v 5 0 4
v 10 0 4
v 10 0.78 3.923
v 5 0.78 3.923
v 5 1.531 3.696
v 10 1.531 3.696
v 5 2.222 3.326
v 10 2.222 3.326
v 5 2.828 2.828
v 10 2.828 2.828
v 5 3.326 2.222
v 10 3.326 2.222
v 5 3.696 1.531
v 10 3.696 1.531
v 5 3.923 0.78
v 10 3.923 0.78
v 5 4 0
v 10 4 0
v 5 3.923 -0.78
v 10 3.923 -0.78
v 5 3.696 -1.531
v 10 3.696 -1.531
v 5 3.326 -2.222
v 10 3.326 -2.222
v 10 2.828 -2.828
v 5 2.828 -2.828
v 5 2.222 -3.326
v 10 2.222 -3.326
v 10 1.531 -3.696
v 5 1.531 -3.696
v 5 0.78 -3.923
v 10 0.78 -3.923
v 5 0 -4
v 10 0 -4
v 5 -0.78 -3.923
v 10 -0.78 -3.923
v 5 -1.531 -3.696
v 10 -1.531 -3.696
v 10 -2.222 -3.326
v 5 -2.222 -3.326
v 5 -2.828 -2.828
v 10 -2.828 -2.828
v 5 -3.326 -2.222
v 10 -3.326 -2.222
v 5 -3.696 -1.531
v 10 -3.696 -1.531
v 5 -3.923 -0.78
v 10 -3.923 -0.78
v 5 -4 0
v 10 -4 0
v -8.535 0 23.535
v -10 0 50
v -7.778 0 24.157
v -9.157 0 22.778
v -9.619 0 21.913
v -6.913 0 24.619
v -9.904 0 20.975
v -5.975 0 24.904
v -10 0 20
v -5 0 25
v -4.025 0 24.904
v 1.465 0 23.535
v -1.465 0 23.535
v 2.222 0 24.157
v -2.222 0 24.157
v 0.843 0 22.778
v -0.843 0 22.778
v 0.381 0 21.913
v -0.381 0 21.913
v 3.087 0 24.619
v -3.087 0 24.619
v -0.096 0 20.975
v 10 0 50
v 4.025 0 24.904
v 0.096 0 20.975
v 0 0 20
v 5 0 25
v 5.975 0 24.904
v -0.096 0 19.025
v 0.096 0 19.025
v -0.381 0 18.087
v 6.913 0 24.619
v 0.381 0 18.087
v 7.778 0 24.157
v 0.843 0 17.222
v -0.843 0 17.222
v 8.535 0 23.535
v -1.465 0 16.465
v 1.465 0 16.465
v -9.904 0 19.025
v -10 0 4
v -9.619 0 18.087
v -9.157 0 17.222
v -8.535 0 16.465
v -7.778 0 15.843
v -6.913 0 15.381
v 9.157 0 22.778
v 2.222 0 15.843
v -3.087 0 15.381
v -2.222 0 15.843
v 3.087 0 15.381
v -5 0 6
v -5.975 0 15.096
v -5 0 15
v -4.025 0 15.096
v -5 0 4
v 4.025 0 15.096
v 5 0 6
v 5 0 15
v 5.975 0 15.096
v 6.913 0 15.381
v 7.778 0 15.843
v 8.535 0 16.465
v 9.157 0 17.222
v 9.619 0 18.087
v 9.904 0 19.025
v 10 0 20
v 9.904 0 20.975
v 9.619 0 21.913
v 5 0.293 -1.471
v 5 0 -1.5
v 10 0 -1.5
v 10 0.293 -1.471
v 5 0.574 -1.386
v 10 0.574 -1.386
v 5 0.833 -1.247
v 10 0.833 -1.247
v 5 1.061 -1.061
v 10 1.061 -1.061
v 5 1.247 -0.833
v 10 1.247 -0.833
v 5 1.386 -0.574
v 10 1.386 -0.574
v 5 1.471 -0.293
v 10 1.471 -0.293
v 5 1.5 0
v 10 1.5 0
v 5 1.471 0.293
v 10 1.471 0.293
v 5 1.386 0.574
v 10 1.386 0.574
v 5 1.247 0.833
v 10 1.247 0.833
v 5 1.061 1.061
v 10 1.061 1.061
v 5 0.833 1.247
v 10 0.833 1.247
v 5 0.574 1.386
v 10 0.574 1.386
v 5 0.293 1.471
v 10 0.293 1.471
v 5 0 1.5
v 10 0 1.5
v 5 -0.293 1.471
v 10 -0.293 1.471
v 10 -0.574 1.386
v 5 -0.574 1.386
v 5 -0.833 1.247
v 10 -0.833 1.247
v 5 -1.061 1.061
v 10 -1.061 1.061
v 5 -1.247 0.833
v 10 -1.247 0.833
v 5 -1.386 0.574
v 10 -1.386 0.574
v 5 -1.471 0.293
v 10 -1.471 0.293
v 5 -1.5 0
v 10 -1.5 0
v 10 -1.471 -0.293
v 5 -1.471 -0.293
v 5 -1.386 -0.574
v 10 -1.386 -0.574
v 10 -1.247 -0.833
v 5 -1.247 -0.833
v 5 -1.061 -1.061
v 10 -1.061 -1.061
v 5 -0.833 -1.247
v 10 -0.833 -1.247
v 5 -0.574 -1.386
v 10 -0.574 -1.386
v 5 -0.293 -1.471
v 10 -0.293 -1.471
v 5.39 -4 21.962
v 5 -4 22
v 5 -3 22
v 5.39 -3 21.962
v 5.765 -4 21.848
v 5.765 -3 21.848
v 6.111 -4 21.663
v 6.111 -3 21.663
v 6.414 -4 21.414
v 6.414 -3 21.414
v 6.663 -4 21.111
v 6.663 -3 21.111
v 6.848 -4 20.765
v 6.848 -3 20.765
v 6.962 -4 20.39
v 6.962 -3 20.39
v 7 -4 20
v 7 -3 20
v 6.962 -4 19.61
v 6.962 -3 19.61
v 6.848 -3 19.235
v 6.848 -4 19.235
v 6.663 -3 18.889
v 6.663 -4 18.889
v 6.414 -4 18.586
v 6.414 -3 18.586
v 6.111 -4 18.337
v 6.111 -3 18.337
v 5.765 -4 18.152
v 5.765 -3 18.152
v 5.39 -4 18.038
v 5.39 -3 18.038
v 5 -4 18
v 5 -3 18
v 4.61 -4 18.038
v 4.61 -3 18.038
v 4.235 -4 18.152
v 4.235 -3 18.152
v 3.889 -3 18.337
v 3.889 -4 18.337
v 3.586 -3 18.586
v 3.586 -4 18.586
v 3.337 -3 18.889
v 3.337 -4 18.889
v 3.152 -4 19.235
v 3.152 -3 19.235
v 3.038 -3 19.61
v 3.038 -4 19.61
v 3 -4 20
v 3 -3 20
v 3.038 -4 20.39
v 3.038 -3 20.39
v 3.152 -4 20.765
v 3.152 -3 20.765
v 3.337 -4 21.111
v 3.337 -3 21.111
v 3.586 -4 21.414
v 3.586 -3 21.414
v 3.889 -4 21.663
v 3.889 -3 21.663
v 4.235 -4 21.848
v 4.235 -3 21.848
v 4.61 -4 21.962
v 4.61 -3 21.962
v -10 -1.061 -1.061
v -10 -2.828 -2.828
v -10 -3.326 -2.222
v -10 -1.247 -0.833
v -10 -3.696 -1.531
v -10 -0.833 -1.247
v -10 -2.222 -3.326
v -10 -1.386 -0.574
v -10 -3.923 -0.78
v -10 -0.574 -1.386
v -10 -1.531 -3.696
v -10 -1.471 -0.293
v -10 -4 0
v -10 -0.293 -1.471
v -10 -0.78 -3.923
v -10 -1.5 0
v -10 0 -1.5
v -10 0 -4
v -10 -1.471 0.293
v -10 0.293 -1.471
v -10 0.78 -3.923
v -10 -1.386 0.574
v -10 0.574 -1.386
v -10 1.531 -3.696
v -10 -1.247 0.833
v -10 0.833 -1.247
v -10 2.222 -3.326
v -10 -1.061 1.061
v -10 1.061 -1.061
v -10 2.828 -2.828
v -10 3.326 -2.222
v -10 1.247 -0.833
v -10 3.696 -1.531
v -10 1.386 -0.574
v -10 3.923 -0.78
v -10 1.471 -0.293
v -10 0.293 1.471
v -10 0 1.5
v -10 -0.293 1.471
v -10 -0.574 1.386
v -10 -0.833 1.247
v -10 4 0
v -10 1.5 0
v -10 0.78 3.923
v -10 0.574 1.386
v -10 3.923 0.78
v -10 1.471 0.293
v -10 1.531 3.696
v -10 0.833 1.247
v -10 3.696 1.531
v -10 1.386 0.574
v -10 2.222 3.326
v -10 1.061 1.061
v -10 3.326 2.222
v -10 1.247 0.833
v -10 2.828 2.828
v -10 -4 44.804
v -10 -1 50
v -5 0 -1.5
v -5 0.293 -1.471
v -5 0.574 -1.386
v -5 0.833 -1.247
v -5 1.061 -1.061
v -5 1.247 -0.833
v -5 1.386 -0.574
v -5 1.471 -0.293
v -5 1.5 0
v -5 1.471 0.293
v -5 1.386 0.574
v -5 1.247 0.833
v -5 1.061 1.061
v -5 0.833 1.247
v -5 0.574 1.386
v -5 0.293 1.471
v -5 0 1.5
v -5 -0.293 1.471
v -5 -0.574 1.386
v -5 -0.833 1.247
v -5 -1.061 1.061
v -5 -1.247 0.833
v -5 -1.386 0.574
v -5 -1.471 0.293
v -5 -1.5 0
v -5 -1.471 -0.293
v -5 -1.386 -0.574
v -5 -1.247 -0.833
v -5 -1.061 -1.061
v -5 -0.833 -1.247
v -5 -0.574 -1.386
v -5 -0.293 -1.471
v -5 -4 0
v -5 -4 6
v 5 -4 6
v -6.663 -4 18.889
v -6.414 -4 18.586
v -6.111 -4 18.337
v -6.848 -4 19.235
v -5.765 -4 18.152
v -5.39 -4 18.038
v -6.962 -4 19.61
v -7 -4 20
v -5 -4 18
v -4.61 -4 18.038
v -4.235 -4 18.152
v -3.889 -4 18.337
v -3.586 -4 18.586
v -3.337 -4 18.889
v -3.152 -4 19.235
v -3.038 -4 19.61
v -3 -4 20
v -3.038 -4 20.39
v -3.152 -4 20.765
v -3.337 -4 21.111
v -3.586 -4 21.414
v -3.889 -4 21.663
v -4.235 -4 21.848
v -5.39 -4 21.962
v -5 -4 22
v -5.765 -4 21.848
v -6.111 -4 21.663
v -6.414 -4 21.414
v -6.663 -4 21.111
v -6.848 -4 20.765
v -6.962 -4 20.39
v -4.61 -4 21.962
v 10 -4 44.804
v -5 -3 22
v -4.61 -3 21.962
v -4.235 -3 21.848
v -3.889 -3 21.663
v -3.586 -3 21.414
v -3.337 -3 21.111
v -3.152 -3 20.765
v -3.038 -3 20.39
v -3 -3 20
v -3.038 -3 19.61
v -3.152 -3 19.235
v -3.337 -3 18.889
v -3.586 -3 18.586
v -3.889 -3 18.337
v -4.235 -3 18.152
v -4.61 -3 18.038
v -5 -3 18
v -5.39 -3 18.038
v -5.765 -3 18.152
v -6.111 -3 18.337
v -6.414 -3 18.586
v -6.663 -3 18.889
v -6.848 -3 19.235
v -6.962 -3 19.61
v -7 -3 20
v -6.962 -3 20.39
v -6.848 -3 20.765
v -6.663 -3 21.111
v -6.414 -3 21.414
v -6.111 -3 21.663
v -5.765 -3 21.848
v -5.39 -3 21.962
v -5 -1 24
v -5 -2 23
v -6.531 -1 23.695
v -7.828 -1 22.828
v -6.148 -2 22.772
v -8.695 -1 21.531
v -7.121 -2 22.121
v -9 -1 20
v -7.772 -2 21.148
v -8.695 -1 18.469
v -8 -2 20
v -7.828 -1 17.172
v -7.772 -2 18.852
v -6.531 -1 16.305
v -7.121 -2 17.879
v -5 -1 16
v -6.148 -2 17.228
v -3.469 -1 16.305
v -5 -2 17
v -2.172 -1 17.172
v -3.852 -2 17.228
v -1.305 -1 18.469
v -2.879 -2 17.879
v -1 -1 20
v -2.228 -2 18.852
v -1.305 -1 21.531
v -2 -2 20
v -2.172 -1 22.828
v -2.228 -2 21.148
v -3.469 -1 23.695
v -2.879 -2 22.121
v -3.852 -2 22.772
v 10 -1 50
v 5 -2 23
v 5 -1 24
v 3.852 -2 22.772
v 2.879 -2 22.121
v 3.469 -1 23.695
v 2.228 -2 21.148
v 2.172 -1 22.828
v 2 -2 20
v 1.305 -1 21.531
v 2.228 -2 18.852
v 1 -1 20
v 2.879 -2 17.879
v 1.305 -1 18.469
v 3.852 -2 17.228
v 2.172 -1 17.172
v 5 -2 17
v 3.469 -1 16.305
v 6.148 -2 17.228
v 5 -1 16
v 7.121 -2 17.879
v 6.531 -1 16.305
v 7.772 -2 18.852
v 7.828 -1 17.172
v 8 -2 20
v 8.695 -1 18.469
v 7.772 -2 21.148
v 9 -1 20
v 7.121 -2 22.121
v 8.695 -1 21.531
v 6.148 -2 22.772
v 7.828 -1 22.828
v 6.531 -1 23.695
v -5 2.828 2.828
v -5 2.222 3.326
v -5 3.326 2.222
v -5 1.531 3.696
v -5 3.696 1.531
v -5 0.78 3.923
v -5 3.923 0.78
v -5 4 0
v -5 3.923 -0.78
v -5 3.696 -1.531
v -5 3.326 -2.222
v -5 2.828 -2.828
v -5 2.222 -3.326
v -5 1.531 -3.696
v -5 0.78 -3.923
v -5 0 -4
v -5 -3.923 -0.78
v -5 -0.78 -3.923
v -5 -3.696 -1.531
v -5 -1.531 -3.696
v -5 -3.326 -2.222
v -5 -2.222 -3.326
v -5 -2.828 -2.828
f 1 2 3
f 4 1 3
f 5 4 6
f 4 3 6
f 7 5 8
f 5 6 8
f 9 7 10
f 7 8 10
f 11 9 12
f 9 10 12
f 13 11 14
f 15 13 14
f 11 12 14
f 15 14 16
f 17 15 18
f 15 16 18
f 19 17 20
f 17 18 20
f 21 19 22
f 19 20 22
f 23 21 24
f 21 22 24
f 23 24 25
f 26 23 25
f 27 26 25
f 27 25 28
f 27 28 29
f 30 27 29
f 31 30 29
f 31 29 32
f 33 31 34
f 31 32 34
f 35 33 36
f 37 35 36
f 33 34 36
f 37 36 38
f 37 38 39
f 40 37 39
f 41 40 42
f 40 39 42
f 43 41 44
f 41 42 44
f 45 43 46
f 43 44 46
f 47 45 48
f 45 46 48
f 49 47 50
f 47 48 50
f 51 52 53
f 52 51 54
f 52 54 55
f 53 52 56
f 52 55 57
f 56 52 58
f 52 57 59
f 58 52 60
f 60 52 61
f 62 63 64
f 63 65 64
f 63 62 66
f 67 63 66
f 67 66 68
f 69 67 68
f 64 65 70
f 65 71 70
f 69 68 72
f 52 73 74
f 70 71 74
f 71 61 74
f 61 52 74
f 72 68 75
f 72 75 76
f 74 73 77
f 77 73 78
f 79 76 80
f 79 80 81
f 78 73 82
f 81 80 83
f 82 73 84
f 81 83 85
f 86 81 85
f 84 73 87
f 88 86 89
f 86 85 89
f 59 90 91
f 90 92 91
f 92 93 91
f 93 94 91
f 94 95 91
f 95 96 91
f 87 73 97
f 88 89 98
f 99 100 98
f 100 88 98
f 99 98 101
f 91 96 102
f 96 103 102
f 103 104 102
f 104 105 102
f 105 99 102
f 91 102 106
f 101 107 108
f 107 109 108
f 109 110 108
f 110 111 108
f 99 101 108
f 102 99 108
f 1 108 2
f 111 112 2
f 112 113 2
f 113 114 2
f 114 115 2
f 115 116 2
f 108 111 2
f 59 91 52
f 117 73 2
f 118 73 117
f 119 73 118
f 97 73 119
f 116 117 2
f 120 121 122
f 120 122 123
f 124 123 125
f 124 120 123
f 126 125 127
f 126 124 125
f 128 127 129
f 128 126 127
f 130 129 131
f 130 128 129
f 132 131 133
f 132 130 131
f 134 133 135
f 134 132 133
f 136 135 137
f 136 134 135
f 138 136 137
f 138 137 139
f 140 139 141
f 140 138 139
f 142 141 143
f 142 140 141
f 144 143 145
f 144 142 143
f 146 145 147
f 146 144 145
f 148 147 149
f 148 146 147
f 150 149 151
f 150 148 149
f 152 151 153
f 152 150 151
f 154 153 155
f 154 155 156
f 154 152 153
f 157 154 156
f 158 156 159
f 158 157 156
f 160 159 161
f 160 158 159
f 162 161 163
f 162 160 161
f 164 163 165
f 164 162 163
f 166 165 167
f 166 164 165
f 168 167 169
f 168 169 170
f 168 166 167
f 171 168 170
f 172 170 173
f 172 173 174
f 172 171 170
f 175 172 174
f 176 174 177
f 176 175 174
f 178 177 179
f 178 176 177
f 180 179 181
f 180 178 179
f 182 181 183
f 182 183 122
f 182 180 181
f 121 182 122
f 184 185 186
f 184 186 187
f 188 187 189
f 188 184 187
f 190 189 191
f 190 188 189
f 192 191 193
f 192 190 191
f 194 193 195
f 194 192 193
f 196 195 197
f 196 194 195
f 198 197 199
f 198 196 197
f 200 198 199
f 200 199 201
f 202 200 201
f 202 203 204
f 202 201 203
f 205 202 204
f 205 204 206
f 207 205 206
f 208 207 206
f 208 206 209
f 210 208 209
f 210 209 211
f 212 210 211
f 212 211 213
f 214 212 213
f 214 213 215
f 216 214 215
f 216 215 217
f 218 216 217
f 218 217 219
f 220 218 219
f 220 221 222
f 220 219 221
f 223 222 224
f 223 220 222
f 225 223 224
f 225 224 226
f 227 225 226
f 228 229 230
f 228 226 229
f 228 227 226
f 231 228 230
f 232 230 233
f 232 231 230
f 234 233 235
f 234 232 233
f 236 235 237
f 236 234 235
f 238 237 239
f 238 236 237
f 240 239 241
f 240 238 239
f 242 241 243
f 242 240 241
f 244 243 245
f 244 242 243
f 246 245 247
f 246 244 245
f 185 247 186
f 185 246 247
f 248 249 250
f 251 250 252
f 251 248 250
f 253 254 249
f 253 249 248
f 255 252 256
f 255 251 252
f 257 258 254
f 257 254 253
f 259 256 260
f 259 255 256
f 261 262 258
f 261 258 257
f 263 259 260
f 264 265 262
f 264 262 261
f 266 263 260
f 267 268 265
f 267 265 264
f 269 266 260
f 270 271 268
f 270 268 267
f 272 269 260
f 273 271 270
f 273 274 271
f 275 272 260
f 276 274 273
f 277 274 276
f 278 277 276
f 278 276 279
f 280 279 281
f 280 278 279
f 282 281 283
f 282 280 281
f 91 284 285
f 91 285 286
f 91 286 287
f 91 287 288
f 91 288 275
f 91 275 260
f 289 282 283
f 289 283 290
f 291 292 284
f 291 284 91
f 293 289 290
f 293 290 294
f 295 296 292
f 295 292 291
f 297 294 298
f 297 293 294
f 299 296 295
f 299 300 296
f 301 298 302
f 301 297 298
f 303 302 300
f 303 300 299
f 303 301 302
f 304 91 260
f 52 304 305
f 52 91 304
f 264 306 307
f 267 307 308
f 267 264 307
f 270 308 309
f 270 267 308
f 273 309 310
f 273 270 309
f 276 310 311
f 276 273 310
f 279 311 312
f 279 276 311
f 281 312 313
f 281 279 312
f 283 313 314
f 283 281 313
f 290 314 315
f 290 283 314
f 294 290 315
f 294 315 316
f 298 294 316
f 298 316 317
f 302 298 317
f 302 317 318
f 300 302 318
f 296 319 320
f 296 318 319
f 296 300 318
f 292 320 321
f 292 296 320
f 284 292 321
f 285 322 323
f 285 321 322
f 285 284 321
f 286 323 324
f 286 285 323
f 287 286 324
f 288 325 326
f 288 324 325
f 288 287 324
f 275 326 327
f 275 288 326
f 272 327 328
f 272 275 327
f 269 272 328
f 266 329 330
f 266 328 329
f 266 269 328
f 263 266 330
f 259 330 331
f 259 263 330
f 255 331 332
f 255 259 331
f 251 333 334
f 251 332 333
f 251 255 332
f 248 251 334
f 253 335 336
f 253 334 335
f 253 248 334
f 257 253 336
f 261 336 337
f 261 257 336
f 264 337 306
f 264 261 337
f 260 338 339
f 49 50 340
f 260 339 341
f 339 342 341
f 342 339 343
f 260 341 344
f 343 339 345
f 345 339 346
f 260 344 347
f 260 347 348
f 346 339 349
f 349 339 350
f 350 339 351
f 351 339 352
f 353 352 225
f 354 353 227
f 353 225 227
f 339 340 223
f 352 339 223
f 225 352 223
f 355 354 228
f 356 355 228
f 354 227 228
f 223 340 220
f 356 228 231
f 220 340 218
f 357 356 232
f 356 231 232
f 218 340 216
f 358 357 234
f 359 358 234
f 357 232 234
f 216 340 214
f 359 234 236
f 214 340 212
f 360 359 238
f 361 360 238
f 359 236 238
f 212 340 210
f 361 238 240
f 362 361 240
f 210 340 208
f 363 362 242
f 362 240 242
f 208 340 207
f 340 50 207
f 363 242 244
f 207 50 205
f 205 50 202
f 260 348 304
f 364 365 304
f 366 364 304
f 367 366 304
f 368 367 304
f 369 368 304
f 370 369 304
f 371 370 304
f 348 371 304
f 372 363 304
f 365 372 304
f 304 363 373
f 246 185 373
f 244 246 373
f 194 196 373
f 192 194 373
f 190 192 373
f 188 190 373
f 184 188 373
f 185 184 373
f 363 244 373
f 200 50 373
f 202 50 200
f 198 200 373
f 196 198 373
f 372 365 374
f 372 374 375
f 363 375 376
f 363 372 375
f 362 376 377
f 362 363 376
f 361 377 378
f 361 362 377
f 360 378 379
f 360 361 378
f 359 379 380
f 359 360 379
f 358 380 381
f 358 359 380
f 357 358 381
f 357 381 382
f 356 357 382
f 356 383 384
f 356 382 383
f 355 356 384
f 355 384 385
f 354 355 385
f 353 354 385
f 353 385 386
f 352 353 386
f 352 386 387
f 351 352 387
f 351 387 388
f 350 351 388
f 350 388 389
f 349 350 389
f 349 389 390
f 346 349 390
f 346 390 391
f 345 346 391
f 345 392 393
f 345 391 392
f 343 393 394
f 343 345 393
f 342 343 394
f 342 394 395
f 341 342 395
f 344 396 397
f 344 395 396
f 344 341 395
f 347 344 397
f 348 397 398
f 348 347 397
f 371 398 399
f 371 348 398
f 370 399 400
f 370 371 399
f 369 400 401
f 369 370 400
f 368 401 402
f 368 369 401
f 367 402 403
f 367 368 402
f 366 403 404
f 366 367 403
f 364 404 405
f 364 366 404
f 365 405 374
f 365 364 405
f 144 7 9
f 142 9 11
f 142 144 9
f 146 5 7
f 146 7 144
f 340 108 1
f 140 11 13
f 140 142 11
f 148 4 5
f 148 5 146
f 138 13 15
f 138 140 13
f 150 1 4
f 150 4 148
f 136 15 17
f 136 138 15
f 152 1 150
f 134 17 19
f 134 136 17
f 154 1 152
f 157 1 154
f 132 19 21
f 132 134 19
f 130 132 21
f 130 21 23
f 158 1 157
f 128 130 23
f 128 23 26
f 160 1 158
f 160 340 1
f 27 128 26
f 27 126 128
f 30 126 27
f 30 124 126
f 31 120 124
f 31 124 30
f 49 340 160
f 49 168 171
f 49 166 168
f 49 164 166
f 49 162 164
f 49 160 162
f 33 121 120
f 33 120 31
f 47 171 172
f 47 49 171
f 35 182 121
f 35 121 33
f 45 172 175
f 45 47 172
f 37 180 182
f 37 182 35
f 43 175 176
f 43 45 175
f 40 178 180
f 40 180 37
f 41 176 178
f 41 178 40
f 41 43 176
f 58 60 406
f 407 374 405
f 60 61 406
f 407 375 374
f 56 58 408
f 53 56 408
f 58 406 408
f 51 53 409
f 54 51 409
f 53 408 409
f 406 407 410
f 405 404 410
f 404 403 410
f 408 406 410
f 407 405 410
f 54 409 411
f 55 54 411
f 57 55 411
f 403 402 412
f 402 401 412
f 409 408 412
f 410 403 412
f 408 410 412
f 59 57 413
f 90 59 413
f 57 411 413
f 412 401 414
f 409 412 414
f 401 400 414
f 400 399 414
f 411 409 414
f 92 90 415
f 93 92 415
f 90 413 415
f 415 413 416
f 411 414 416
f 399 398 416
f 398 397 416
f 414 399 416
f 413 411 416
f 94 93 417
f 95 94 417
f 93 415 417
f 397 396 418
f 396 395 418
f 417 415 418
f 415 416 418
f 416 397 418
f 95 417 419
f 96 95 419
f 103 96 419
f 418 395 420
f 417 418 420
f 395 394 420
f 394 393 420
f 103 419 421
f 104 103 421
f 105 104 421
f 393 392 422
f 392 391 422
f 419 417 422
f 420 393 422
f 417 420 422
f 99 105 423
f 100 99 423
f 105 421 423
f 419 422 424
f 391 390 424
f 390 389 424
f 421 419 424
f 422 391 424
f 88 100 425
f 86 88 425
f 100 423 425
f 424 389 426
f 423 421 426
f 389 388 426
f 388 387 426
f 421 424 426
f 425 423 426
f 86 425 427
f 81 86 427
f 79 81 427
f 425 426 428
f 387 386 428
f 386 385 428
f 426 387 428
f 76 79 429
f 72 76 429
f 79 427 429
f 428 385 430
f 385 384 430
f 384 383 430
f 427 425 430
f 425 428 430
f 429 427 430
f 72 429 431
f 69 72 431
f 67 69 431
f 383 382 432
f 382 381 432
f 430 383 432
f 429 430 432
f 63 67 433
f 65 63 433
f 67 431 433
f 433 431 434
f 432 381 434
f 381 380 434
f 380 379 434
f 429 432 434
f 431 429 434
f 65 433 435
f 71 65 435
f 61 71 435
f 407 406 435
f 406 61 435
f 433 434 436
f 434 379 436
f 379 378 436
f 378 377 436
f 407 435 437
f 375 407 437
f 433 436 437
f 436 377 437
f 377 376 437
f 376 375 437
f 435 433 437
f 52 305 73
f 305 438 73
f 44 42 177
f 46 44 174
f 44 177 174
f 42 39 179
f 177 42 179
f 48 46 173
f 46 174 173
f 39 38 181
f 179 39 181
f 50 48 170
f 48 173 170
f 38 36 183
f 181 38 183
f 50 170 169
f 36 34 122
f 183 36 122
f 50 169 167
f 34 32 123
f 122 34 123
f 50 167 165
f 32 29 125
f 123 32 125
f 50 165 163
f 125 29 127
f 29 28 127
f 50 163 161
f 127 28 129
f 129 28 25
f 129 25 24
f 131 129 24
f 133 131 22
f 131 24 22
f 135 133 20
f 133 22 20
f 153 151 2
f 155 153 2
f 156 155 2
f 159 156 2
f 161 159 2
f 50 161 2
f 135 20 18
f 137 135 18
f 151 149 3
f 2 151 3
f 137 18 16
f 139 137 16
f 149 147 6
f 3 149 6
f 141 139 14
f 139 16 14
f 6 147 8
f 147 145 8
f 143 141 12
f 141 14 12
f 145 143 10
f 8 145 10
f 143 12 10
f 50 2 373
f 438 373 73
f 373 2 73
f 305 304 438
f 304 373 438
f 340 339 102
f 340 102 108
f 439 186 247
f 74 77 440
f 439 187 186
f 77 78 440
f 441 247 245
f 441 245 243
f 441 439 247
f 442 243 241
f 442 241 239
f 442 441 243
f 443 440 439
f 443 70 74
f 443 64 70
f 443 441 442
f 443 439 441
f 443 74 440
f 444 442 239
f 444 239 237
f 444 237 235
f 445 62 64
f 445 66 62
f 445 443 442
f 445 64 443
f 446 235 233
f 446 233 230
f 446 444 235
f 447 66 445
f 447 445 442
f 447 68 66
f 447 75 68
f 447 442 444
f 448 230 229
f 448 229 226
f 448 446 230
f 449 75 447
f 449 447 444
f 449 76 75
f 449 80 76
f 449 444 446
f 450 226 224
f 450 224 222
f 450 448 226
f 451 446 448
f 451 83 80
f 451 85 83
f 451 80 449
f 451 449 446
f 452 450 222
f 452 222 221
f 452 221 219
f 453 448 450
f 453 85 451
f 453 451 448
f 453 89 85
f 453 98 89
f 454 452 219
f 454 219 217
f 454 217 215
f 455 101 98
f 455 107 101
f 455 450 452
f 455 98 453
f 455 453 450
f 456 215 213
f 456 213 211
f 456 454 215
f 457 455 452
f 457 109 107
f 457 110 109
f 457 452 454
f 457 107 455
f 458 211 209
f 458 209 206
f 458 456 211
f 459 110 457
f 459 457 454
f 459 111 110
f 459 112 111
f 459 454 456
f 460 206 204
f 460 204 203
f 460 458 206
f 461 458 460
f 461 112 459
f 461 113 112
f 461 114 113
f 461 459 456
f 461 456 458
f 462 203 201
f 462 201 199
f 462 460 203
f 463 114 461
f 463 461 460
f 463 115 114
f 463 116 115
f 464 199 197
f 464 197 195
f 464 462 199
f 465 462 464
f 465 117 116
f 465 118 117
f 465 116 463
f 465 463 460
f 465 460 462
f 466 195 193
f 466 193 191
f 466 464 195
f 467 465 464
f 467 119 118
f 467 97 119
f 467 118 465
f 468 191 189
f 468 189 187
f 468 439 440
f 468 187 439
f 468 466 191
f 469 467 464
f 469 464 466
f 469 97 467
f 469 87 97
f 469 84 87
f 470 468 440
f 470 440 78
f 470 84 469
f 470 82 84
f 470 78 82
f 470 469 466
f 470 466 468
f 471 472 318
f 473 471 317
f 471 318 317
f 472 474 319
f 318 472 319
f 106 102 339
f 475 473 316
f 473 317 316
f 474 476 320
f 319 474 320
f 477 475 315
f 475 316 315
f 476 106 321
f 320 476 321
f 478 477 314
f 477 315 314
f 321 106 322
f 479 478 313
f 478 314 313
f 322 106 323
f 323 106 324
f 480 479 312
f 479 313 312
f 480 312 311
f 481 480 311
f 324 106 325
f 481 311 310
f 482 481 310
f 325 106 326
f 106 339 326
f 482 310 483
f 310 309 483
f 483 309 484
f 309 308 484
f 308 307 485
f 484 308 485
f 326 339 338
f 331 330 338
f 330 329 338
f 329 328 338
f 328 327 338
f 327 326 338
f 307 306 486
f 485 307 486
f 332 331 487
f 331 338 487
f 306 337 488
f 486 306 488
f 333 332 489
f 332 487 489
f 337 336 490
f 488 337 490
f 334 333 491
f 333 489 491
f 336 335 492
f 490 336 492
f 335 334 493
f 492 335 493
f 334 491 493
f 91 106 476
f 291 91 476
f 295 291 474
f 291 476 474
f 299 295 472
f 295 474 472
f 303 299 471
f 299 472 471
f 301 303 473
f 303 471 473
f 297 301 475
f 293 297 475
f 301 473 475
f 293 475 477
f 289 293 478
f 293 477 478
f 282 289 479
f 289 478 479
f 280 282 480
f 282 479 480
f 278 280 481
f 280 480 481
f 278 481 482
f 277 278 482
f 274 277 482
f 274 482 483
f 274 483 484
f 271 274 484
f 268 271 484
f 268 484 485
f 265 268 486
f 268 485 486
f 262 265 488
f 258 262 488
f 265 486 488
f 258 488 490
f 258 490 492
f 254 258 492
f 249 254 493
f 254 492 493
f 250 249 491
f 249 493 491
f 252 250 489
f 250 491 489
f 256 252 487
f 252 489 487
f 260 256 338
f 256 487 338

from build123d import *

# Parameters (mm, degrees)
SKETCH_1_R               = 1.5
EXTRUDE_1_DEPTH          = 10
CUT_EXTRUDE_1_DEPTH      = 52.14684741
CUT_EXTRUDE_1_DEPTH_BACK = 52.14684741
SKETCH_2_R               = 2
SKETCH_2_W               = 10
SKETCH_2_H               = 10
CHAMFER_1_SIZE           = 3


with BuildPart() as part:
    # 草图1 → 凸台-拉伸1 (new, symmetric)
    with BuildSketch(Plane(origin=(0, 0, 0), x_dir=(0, 0, -1), z_dir=(1, 0, 0))):
        with BuildLine():
            Line((0, -4), (-44.803847577, -4))
            Line((-44.803847577, -4), (-50, -1))
            Line((-50, -1), (-50, 0))
            Line((-50, 0), (-4, 0))
            ThreePointArc((-4, 0), (2.828427125, 2.828427125), (0, -4))
        make_face()
        Circle(SKETCH_1_R, mode=Mode.SUBTRACT)
    extrude(amount=EXTRUDE_1_DEPTH, both=True)

    # 草图2 → 切除-拉伸1 (cut, two sides: drawn at the far end of the back side and taken through both)
    with BuildSketch(Plane(origin=(0, 0, 0), x_dir=(1, 0, 0), z_dir=(0, 1, 0)).offset(-CUT_EXTRUDE_1_DEPTH_BACK)):
        with Locations(Location((-5, -20, 0), (0, 0, 270))):
            Circle(SKETCH_2_R)
        with Locations(Location((5, -20, 0), (0, 0, 270))):
            Circle(SKETCH_2_R)
        with Locations((0, -1)):
            Rectangle(SKETCH_2_W, SKETCH_2_H)
    extrude(amount=CUT_EXTRUDE_1_DEPTH + CUT_EXTRUDE_1_DEPTH_BACK, mode=Mode.SUBTRACT)

    # 倒角1
    chamfer_1_edges = [part.edges().sort_by_distance(p)[0] for p in [
        (5, 0, 18),
        (-5, 0, 18),
    ]]
    chamfer(chamfer_1_edges, length=CHAMFER_1_SIZE - 0.0001)  # a hair under: the kernel refuses the full size


solid = part.part
